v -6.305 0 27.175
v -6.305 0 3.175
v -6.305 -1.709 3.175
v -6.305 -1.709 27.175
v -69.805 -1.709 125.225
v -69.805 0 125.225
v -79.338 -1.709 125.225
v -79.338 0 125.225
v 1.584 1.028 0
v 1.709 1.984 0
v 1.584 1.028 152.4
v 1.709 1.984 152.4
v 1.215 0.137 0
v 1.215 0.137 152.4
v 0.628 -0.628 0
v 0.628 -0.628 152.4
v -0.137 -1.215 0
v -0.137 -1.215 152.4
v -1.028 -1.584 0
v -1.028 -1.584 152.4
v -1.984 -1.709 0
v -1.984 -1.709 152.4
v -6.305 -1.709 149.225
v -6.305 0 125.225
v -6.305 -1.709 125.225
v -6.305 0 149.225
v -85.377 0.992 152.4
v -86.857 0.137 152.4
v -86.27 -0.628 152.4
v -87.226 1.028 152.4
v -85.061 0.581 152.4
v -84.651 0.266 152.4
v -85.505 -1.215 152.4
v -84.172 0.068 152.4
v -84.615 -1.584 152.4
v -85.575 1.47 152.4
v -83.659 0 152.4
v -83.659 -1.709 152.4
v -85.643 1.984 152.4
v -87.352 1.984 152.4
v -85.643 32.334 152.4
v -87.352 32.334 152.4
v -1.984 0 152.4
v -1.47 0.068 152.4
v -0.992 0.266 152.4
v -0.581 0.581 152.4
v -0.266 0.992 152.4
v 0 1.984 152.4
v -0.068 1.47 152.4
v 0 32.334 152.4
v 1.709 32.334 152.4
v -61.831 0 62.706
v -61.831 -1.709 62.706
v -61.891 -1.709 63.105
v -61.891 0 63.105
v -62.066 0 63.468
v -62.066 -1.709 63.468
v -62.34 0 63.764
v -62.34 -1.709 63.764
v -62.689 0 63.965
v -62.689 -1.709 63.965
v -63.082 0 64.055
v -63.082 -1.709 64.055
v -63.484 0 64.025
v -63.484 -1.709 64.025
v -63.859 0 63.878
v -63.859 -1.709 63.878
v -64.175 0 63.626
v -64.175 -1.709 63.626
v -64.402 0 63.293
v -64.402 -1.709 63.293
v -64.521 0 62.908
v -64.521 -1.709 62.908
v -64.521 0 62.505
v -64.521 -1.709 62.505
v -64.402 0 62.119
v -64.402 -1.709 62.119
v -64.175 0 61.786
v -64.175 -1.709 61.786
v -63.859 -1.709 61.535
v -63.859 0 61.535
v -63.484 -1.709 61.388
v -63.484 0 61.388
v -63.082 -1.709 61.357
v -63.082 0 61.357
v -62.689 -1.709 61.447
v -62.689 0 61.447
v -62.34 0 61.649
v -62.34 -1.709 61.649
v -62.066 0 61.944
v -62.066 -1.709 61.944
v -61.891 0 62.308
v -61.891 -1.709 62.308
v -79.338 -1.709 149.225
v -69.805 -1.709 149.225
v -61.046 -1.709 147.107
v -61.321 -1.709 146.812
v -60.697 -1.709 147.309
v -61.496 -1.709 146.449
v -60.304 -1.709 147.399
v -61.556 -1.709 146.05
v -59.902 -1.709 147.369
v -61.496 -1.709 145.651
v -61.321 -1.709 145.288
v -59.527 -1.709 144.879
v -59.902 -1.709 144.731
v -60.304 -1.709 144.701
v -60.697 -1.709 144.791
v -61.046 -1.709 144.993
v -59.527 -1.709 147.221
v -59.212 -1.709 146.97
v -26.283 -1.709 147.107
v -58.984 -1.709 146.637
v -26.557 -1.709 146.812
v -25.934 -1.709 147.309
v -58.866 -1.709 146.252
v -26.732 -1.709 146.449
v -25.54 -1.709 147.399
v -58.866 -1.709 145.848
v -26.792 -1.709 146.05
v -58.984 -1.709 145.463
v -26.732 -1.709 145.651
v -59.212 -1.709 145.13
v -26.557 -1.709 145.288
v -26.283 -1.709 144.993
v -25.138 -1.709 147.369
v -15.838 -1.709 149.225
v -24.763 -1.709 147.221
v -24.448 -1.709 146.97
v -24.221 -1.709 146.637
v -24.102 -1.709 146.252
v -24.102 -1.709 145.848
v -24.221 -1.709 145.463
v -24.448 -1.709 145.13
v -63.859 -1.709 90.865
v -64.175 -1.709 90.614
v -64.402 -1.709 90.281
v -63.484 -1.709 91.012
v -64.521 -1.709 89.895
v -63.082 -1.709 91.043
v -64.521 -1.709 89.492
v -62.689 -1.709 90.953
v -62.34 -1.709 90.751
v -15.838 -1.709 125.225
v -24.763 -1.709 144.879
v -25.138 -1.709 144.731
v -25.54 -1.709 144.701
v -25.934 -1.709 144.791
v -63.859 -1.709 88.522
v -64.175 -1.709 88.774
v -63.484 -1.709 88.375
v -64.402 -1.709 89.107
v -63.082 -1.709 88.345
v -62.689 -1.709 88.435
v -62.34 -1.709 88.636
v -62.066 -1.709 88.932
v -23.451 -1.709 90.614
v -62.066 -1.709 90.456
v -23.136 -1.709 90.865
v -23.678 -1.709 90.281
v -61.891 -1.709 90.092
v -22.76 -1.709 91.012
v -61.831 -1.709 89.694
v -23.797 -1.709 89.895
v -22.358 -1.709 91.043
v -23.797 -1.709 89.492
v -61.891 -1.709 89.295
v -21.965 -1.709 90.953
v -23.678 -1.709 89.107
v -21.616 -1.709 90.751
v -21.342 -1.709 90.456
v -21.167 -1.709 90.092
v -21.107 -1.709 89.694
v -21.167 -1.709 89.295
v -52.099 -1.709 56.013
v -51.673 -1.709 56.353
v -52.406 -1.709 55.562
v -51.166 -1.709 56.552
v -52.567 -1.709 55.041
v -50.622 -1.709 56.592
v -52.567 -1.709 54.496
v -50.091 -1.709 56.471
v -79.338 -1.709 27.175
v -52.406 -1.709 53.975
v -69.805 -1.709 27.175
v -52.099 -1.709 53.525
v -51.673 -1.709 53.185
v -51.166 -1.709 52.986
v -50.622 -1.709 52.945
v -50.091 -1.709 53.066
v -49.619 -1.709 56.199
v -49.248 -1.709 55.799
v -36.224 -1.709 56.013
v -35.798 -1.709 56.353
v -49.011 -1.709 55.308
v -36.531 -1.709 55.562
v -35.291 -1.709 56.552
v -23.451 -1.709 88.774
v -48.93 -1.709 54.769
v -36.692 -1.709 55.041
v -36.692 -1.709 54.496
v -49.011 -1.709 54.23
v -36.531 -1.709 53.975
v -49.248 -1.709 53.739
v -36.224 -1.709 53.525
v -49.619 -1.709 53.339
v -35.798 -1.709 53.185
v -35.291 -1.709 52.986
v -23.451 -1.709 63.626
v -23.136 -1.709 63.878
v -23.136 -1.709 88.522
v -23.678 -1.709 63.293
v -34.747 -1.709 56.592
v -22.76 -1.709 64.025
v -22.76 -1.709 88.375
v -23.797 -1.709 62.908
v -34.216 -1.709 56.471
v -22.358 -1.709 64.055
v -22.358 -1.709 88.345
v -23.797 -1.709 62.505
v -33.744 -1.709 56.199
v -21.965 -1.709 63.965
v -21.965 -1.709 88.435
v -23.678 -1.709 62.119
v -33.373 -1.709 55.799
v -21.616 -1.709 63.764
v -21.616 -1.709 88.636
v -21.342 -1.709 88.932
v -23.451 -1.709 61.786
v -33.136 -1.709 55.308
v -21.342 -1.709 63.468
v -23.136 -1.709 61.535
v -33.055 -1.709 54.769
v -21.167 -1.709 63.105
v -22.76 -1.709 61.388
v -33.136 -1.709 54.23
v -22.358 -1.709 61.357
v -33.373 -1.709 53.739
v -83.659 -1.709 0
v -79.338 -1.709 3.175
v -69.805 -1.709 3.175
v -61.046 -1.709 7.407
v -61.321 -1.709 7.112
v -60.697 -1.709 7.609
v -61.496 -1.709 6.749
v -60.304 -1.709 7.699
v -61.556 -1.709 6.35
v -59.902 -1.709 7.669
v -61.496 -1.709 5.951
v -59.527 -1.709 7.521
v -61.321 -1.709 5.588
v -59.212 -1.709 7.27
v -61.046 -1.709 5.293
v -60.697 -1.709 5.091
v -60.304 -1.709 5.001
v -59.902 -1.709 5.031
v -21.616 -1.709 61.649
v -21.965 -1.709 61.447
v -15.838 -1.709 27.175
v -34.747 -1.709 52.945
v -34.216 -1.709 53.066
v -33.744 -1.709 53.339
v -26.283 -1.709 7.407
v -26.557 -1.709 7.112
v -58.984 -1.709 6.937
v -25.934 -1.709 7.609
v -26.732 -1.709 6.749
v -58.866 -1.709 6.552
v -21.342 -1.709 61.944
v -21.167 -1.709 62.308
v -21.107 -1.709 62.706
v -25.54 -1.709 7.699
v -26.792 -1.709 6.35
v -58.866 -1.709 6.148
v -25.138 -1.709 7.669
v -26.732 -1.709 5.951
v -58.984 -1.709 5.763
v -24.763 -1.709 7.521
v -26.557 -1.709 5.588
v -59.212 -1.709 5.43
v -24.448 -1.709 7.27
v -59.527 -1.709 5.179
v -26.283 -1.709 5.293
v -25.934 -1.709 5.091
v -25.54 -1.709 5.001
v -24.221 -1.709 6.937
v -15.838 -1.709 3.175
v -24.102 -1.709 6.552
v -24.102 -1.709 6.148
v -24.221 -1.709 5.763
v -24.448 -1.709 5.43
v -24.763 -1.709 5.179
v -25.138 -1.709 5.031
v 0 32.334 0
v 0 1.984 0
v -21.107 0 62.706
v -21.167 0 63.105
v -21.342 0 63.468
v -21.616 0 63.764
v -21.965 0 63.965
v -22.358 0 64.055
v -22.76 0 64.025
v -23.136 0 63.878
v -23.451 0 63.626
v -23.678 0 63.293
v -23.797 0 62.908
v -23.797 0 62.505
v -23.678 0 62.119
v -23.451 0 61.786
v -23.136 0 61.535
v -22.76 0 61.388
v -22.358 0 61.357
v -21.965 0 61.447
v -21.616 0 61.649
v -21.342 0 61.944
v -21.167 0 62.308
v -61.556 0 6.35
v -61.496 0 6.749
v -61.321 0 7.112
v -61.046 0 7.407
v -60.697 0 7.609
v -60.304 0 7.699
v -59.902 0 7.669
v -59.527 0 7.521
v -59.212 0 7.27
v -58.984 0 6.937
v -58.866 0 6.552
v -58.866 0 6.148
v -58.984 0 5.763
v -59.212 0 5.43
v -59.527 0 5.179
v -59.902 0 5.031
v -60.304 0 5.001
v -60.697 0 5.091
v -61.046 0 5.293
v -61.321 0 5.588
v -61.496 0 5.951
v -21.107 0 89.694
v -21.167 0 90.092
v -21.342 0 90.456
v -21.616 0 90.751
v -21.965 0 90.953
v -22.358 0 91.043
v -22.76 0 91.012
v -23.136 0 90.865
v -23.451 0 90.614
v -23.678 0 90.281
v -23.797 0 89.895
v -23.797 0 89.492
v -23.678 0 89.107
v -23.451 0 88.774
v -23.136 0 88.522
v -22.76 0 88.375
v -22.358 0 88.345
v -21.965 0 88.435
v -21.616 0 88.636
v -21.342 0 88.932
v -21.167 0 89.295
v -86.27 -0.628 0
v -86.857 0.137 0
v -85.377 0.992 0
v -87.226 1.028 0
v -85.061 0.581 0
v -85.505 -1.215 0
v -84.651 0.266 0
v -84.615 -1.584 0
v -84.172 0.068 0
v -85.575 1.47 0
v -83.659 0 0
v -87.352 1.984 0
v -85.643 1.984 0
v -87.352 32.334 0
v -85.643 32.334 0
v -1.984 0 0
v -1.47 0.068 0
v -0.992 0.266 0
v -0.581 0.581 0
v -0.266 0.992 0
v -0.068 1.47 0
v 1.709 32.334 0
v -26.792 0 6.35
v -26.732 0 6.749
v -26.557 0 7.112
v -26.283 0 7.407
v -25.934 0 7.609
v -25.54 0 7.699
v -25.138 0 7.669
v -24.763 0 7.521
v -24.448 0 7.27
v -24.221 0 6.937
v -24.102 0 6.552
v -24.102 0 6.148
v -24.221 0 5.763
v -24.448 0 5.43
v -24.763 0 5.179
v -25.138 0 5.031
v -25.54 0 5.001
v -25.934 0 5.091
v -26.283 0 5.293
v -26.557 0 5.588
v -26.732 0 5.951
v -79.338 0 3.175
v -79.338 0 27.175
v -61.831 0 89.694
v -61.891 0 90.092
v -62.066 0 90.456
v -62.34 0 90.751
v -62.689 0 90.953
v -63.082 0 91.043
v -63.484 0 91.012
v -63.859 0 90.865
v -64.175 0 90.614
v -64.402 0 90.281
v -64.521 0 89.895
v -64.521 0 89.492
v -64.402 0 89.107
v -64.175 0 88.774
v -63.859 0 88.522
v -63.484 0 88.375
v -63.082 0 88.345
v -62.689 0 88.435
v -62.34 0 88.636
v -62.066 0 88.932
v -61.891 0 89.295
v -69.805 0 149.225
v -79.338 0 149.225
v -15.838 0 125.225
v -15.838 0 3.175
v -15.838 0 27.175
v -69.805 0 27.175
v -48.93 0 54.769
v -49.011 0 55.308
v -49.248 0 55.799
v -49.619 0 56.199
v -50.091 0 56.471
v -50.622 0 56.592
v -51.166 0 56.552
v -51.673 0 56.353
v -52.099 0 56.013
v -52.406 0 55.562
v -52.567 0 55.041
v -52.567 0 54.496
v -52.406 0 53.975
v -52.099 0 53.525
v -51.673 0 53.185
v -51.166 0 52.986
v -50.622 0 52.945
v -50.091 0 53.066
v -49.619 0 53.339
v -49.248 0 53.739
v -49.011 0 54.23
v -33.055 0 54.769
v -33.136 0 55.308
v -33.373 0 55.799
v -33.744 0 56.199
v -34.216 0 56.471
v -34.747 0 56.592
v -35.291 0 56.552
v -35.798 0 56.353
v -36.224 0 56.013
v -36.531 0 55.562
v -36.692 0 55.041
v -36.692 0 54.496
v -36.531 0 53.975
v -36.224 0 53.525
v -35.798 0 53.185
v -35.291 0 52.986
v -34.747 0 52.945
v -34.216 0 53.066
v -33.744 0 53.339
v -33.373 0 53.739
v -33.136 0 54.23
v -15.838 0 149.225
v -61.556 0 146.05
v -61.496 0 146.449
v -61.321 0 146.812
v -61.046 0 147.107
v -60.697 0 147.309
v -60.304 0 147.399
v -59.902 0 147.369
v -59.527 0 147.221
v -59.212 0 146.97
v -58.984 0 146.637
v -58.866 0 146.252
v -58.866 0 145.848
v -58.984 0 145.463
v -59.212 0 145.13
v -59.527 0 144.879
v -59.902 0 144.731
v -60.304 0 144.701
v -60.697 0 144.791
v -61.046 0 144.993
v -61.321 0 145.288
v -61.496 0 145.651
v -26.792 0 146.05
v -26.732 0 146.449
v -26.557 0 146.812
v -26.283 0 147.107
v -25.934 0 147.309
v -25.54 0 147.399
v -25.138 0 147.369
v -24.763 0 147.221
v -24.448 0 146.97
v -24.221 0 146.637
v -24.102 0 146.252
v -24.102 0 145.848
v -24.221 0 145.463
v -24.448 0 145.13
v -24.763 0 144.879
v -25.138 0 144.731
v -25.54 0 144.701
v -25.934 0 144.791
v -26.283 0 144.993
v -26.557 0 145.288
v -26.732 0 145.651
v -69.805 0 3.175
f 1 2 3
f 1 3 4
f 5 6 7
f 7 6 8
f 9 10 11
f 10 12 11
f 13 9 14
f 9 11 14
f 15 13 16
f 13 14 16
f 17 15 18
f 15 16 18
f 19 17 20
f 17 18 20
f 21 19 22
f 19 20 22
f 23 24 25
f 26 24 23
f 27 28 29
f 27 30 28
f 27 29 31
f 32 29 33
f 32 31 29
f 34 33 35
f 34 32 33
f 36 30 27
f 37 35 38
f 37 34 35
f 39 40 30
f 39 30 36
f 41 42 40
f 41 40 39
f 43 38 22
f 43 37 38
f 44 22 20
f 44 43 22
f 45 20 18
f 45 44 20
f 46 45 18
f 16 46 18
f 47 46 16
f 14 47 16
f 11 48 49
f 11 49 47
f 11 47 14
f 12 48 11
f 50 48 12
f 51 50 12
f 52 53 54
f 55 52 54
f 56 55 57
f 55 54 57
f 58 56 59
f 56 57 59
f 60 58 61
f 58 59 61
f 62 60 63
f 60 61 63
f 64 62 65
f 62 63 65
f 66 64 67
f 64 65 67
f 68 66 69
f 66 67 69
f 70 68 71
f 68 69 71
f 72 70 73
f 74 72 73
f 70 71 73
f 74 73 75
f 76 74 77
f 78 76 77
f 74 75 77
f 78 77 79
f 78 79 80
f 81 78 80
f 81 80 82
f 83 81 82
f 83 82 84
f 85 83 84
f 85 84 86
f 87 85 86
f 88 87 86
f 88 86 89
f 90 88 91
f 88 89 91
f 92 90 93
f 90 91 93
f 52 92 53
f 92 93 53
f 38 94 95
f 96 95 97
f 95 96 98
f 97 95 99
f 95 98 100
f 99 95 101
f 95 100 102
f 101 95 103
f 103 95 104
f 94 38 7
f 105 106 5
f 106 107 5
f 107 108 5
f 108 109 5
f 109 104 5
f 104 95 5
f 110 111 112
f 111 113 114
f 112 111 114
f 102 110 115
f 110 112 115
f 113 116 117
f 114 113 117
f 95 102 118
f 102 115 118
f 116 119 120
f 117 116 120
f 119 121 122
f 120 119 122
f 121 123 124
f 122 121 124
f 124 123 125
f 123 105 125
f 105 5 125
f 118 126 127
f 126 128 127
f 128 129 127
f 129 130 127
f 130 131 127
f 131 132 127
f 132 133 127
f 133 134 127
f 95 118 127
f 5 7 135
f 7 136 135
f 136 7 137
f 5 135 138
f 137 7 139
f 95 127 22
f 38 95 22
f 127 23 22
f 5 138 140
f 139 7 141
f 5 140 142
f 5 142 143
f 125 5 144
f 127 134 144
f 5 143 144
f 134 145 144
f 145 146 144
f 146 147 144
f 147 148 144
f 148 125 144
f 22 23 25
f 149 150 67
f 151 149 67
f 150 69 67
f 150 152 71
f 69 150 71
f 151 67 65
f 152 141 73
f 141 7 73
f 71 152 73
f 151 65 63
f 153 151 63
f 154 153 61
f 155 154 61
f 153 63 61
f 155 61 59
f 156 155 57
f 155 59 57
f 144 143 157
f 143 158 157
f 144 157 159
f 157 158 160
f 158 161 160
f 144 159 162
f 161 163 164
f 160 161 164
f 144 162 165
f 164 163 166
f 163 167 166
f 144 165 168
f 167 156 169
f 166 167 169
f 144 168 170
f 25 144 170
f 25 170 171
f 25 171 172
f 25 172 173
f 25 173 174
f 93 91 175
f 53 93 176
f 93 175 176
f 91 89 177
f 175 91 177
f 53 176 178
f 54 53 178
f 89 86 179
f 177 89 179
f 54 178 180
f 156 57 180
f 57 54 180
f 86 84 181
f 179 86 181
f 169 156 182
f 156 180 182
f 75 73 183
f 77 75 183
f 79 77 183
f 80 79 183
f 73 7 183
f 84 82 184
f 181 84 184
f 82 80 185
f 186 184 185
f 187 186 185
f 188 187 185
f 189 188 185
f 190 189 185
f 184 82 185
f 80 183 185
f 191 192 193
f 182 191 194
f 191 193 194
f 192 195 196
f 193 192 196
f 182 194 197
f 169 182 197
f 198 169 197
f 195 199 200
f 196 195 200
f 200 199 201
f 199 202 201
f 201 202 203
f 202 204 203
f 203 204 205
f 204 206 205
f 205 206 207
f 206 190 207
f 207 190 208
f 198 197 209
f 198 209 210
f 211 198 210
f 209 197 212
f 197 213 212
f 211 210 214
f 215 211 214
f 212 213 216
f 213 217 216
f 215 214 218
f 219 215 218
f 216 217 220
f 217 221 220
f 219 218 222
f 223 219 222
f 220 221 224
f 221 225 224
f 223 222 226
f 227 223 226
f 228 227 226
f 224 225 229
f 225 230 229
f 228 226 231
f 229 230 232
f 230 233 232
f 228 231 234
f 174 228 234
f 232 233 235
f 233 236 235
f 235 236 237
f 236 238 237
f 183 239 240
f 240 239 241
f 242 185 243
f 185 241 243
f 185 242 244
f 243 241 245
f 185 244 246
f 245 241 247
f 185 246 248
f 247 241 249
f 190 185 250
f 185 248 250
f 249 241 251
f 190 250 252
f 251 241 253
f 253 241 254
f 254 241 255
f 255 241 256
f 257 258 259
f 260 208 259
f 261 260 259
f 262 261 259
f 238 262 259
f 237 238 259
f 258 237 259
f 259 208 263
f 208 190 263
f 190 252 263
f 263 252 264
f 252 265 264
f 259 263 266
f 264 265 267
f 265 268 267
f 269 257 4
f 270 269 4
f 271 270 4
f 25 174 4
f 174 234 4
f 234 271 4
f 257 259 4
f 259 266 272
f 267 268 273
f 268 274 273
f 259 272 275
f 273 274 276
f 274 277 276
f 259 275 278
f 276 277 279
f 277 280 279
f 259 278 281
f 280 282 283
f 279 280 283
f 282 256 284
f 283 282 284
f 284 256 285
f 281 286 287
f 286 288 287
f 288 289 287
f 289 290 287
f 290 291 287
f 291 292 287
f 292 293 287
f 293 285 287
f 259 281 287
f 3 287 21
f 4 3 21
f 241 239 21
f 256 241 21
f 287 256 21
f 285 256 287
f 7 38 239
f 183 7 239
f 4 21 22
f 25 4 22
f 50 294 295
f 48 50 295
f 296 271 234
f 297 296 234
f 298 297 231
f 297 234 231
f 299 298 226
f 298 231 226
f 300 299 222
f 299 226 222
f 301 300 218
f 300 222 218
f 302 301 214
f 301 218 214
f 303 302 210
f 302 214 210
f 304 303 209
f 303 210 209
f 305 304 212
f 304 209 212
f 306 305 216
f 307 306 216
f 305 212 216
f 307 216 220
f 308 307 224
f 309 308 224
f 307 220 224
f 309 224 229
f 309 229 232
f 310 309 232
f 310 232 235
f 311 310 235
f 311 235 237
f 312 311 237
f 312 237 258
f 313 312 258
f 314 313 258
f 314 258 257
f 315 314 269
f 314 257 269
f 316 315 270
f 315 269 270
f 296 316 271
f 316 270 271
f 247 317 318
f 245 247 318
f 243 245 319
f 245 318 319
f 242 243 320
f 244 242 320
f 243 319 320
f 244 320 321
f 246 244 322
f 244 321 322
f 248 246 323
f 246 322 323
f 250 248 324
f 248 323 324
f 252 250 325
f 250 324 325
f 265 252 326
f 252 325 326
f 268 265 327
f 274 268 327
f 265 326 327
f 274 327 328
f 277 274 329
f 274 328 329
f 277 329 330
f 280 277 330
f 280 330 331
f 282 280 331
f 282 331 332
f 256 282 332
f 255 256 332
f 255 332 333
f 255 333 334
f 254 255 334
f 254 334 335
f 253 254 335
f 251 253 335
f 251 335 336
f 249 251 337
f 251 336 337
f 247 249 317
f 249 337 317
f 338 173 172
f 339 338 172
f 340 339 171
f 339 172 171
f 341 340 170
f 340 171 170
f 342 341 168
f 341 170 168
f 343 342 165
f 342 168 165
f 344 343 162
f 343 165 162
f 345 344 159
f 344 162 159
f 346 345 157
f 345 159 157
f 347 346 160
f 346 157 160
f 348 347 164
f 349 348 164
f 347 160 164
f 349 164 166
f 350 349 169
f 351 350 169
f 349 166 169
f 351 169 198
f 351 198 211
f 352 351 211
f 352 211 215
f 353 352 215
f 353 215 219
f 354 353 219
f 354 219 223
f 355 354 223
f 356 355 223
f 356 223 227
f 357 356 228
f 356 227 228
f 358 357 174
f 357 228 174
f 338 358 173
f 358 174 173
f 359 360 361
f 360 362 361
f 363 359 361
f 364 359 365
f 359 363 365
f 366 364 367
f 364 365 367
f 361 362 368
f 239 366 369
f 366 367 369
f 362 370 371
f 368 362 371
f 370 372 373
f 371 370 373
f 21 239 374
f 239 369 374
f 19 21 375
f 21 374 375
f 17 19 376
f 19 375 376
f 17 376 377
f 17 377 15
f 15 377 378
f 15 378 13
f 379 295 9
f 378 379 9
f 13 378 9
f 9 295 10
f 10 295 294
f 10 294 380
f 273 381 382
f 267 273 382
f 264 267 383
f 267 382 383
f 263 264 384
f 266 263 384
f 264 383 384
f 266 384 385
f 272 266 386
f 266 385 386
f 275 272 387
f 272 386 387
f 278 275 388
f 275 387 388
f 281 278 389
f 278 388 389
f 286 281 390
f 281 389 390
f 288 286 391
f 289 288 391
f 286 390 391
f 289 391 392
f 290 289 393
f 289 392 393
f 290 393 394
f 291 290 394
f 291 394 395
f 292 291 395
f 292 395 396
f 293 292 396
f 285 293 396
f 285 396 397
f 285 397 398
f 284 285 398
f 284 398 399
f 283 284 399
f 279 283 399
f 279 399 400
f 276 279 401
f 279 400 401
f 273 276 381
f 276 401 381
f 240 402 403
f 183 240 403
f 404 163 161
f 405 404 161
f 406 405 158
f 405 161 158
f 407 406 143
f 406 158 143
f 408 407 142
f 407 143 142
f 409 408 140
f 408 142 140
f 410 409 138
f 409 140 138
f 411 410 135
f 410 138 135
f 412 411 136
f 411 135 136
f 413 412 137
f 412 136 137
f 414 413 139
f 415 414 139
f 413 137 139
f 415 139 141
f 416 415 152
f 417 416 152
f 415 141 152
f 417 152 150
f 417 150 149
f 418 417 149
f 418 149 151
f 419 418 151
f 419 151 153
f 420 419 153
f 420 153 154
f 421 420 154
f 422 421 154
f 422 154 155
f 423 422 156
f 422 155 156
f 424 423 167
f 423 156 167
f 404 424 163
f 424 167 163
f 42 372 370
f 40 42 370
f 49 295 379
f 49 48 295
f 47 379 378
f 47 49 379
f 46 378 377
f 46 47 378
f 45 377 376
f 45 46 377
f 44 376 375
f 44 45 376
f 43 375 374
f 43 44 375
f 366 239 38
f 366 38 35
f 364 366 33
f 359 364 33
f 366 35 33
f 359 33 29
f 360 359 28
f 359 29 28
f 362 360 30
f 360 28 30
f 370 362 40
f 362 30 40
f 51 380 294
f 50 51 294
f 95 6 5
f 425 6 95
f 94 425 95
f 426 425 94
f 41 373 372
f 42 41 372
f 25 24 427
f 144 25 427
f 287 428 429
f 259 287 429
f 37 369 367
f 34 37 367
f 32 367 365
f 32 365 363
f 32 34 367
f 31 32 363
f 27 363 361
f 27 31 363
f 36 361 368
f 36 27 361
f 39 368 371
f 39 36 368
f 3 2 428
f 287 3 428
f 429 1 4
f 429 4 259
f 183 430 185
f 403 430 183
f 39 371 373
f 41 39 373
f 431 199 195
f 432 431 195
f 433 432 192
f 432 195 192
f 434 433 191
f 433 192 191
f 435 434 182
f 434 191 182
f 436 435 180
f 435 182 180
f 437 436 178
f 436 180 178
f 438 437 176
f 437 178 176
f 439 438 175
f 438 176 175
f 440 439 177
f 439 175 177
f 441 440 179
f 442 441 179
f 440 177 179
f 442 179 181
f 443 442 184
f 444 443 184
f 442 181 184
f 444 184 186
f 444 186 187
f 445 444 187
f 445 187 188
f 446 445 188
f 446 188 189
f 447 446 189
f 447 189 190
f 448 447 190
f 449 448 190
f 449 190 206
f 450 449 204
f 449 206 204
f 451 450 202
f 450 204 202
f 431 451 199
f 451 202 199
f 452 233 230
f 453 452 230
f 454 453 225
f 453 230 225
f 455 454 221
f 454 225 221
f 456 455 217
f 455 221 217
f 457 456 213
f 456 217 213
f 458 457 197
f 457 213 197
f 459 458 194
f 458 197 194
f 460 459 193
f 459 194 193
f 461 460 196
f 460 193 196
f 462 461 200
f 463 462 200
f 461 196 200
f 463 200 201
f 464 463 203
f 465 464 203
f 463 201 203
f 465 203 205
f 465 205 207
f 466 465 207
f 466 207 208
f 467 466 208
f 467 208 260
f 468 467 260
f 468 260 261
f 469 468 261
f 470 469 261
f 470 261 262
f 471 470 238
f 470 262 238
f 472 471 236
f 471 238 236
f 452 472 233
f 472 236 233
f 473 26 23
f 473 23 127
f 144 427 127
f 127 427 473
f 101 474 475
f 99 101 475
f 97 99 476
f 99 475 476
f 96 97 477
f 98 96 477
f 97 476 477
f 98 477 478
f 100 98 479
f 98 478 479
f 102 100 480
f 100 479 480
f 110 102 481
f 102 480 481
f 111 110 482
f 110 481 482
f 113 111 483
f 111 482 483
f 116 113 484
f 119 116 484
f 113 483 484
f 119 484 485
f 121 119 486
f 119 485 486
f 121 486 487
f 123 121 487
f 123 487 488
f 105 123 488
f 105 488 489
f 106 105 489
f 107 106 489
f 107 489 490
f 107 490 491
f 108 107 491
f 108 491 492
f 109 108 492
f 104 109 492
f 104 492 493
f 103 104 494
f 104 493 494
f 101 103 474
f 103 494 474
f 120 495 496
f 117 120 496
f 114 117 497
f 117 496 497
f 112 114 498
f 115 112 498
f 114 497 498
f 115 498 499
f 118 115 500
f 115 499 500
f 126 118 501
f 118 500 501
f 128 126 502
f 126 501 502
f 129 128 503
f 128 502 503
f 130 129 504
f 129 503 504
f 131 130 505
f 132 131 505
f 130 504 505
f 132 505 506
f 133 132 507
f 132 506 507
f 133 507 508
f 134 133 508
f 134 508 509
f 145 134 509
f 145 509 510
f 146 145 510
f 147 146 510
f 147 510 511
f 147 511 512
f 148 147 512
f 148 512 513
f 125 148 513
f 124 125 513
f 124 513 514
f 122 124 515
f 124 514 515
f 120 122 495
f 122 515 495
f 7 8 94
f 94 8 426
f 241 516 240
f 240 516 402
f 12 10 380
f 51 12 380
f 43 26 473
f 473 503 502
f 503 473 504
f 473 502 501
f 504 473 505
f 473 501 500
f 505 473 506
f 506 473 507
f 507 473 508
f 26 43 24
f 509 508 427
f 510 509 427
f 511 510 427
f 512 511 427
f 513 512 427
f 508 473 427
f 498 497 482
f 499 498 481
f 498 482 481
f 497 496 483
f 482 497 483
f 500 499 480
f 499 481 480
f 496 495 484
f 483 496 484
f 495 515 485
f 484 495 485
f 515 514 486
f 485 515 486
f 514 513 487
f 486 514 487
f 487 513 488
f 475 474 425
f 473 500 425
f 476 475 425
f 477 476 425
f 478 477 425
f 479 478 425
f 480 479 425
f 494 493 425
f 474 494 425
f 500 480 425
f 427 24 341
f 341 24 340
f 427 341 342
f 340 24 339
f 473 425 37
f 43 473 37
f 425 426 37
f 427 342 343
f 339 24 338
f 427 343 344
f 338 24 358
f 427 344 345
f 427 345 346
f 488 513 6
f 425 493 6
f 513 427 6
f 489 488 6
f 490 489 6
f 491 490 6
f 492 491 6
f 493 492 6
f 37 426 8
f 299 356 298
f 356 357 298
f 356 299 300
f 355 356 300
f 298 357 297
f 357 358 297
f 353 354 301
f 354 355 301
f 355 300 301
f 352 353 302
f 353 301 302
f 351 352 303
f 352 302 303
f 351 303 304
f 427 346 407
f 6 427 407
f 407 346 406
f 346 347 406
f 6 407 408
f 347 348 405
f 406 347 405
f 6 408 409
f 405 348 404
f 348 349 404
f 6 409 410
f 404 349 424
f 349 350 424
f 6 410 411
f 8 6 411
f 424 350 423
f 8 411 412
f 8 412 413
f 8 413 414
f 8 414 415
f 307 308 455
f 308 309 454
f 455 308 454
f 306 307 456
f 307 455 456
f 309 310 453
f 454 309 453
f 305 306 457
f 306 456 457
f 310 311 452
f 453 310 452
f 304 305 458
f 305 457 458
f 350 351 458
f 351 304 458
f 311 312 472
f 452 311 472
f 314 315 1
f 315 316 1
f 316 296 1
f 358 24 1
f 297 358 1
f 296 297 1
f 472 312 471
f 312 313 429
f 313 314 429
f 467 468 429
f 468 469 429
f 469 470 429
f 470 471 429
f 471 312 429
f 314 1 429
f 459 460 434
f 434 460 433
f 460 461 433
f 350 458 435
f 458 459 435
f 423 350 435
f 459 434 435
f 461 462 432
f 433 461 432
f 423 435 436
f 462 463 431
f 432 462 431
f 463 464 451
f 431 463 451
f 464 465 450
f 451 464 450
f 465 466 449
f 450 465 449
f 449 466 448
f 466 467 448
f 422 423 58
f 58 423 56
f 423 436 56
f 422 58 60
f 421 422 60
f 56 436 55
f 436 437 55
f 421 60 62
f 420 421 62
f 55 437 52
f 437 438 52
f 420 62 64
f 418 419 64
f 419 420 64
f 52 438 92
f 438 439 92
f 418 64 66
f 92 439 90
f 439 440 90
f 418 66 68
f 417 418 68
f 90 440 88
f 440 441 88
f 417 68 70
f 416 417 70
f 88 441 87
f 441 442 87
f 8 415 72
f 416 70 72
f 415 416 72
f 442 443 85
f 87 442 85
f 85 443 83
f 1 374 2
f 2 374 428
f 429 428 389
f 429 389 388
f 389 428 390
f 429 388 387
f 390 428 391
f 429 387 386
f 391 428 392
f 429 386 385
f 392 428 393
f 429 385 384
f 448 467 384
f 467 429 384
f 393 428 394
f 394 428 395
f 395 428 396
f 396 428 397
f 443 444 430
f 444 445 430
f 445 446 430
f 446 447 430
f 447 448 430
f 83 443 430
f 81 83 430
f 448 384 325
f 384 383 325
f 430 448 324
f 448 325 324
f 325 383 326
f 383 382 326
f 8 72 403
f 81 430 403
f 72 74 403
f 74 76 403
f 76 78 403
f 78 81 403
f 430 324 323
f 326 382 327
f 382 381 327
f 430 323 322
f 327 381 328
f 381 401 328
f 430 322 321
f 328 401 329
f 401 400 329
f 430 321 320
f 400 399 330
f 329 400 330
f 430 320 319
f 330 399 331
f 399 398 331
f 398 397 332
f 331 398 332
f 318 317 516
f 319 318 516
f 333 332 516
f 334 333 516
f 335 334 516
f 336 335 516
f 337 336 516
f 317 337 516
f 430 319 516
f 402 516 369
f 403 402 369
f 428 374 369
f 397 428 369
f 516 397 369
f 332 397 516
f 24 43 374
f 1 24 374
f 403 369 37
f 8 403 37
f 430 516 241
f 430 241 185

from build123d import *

# Parameters (mm, degrees)
F1_DEPTH = 152.4
F2_R     = 1.98374
F3_R     = 3.69316
F4_W     = 9.5329248
F4_H     = 24
F4_R     = 1.35255
F5_DEPTH = 1.70942
F6_R     = 1.35255
F6_R_2   = 1.8288
F7_DEPTH = 1.70942


with BuildPart() as f1:
    # F0 (on Top) → F1 (new body)
    with BuildSketch(Plane.XY):
        Polygon((0, 32.3337428), (0, 0), (-85.6425008, 0), (-85.6425008, 32.3337428), (-87.3519208, 32.3337428), (-87.3519208, -1.70942), (1.70942, -1.70942), (1.70942, 32.3337428), align=None)
    extrude(amount=F1_DEPTH)

    # F2
    f2_edges = [f1.edges().sort_by_distance(p)[0] for p in [
        (0, 0, 76.2),
        (-85.642501, 0, 76.2),
    ]]
    fillet(f2_edges, radius=F2_R)

    # F3
    f3_edges = [f1.edges().sort_by_distance(p)[0] for p in [
        (1.70942, -1.70942, 76.2),
        (-87.351921, -1.70942, 76.2),
    ]]
    fillet(f3_edges, radius=F3_R)

    # F4 (on face) → F5 (cut, through all)
    with BuildSketch(Plane(origin=(0, 0, 0), x_dir=(-1, 0, 0), z_dir=(0, 1, 0))):
        with Locations((74.5712504, 15.175)):
            Rectangle(F4_W, F4_H)
        with Locations((11.0712504, 15.175)):
            Rectangle(F4_W, F4_H)
        with Locations((11.0712504, 137.225)):
            Rectangle(F4_W, F4_H)
        with Locations((74.5712504, 137.225)):
            Rectangle(F4_W, F4_H)
        with Locations((60.20308, 6.35)):
            Circle(F4_R)
        with Locations((25.4394208, 6.35)):
            Circle(F4_R)
        with Locations((25.4394208, 146.05)):
            Circle(F4_R)
        with Locations((60.20308, 146.05)):
            Circle(F4_R)
    extrude(amount=-F5_DEPTH, mode=Mode.SUBTRACT)

    # F6 (on face) → F7 (cut, through all)
    with BuildSketch(Plane.XZ.offset(1.70942)):
        with Locations((-63.1831604, 89.69375)):
            Circle(F6_R)
        with Locations((-22.4593404, 89.69375)):
            Circle(F6_R)
        with Locations((-22.4593404, 62.70625)):
            Circle(F6_R)
        with Locations((-63.1831604, 62.70625)):
            Circle(F6_R)
        with Locations((-50.7587504, 54.76875)):
            Circle(F6_R_2)
        with Locations((-34.8837504, 54.76875)):
            Circle(F6_R_2)
    extrude(amount=-F7_DEPTH, mode=Mode.SUBTRACT)


solid = f1.part
